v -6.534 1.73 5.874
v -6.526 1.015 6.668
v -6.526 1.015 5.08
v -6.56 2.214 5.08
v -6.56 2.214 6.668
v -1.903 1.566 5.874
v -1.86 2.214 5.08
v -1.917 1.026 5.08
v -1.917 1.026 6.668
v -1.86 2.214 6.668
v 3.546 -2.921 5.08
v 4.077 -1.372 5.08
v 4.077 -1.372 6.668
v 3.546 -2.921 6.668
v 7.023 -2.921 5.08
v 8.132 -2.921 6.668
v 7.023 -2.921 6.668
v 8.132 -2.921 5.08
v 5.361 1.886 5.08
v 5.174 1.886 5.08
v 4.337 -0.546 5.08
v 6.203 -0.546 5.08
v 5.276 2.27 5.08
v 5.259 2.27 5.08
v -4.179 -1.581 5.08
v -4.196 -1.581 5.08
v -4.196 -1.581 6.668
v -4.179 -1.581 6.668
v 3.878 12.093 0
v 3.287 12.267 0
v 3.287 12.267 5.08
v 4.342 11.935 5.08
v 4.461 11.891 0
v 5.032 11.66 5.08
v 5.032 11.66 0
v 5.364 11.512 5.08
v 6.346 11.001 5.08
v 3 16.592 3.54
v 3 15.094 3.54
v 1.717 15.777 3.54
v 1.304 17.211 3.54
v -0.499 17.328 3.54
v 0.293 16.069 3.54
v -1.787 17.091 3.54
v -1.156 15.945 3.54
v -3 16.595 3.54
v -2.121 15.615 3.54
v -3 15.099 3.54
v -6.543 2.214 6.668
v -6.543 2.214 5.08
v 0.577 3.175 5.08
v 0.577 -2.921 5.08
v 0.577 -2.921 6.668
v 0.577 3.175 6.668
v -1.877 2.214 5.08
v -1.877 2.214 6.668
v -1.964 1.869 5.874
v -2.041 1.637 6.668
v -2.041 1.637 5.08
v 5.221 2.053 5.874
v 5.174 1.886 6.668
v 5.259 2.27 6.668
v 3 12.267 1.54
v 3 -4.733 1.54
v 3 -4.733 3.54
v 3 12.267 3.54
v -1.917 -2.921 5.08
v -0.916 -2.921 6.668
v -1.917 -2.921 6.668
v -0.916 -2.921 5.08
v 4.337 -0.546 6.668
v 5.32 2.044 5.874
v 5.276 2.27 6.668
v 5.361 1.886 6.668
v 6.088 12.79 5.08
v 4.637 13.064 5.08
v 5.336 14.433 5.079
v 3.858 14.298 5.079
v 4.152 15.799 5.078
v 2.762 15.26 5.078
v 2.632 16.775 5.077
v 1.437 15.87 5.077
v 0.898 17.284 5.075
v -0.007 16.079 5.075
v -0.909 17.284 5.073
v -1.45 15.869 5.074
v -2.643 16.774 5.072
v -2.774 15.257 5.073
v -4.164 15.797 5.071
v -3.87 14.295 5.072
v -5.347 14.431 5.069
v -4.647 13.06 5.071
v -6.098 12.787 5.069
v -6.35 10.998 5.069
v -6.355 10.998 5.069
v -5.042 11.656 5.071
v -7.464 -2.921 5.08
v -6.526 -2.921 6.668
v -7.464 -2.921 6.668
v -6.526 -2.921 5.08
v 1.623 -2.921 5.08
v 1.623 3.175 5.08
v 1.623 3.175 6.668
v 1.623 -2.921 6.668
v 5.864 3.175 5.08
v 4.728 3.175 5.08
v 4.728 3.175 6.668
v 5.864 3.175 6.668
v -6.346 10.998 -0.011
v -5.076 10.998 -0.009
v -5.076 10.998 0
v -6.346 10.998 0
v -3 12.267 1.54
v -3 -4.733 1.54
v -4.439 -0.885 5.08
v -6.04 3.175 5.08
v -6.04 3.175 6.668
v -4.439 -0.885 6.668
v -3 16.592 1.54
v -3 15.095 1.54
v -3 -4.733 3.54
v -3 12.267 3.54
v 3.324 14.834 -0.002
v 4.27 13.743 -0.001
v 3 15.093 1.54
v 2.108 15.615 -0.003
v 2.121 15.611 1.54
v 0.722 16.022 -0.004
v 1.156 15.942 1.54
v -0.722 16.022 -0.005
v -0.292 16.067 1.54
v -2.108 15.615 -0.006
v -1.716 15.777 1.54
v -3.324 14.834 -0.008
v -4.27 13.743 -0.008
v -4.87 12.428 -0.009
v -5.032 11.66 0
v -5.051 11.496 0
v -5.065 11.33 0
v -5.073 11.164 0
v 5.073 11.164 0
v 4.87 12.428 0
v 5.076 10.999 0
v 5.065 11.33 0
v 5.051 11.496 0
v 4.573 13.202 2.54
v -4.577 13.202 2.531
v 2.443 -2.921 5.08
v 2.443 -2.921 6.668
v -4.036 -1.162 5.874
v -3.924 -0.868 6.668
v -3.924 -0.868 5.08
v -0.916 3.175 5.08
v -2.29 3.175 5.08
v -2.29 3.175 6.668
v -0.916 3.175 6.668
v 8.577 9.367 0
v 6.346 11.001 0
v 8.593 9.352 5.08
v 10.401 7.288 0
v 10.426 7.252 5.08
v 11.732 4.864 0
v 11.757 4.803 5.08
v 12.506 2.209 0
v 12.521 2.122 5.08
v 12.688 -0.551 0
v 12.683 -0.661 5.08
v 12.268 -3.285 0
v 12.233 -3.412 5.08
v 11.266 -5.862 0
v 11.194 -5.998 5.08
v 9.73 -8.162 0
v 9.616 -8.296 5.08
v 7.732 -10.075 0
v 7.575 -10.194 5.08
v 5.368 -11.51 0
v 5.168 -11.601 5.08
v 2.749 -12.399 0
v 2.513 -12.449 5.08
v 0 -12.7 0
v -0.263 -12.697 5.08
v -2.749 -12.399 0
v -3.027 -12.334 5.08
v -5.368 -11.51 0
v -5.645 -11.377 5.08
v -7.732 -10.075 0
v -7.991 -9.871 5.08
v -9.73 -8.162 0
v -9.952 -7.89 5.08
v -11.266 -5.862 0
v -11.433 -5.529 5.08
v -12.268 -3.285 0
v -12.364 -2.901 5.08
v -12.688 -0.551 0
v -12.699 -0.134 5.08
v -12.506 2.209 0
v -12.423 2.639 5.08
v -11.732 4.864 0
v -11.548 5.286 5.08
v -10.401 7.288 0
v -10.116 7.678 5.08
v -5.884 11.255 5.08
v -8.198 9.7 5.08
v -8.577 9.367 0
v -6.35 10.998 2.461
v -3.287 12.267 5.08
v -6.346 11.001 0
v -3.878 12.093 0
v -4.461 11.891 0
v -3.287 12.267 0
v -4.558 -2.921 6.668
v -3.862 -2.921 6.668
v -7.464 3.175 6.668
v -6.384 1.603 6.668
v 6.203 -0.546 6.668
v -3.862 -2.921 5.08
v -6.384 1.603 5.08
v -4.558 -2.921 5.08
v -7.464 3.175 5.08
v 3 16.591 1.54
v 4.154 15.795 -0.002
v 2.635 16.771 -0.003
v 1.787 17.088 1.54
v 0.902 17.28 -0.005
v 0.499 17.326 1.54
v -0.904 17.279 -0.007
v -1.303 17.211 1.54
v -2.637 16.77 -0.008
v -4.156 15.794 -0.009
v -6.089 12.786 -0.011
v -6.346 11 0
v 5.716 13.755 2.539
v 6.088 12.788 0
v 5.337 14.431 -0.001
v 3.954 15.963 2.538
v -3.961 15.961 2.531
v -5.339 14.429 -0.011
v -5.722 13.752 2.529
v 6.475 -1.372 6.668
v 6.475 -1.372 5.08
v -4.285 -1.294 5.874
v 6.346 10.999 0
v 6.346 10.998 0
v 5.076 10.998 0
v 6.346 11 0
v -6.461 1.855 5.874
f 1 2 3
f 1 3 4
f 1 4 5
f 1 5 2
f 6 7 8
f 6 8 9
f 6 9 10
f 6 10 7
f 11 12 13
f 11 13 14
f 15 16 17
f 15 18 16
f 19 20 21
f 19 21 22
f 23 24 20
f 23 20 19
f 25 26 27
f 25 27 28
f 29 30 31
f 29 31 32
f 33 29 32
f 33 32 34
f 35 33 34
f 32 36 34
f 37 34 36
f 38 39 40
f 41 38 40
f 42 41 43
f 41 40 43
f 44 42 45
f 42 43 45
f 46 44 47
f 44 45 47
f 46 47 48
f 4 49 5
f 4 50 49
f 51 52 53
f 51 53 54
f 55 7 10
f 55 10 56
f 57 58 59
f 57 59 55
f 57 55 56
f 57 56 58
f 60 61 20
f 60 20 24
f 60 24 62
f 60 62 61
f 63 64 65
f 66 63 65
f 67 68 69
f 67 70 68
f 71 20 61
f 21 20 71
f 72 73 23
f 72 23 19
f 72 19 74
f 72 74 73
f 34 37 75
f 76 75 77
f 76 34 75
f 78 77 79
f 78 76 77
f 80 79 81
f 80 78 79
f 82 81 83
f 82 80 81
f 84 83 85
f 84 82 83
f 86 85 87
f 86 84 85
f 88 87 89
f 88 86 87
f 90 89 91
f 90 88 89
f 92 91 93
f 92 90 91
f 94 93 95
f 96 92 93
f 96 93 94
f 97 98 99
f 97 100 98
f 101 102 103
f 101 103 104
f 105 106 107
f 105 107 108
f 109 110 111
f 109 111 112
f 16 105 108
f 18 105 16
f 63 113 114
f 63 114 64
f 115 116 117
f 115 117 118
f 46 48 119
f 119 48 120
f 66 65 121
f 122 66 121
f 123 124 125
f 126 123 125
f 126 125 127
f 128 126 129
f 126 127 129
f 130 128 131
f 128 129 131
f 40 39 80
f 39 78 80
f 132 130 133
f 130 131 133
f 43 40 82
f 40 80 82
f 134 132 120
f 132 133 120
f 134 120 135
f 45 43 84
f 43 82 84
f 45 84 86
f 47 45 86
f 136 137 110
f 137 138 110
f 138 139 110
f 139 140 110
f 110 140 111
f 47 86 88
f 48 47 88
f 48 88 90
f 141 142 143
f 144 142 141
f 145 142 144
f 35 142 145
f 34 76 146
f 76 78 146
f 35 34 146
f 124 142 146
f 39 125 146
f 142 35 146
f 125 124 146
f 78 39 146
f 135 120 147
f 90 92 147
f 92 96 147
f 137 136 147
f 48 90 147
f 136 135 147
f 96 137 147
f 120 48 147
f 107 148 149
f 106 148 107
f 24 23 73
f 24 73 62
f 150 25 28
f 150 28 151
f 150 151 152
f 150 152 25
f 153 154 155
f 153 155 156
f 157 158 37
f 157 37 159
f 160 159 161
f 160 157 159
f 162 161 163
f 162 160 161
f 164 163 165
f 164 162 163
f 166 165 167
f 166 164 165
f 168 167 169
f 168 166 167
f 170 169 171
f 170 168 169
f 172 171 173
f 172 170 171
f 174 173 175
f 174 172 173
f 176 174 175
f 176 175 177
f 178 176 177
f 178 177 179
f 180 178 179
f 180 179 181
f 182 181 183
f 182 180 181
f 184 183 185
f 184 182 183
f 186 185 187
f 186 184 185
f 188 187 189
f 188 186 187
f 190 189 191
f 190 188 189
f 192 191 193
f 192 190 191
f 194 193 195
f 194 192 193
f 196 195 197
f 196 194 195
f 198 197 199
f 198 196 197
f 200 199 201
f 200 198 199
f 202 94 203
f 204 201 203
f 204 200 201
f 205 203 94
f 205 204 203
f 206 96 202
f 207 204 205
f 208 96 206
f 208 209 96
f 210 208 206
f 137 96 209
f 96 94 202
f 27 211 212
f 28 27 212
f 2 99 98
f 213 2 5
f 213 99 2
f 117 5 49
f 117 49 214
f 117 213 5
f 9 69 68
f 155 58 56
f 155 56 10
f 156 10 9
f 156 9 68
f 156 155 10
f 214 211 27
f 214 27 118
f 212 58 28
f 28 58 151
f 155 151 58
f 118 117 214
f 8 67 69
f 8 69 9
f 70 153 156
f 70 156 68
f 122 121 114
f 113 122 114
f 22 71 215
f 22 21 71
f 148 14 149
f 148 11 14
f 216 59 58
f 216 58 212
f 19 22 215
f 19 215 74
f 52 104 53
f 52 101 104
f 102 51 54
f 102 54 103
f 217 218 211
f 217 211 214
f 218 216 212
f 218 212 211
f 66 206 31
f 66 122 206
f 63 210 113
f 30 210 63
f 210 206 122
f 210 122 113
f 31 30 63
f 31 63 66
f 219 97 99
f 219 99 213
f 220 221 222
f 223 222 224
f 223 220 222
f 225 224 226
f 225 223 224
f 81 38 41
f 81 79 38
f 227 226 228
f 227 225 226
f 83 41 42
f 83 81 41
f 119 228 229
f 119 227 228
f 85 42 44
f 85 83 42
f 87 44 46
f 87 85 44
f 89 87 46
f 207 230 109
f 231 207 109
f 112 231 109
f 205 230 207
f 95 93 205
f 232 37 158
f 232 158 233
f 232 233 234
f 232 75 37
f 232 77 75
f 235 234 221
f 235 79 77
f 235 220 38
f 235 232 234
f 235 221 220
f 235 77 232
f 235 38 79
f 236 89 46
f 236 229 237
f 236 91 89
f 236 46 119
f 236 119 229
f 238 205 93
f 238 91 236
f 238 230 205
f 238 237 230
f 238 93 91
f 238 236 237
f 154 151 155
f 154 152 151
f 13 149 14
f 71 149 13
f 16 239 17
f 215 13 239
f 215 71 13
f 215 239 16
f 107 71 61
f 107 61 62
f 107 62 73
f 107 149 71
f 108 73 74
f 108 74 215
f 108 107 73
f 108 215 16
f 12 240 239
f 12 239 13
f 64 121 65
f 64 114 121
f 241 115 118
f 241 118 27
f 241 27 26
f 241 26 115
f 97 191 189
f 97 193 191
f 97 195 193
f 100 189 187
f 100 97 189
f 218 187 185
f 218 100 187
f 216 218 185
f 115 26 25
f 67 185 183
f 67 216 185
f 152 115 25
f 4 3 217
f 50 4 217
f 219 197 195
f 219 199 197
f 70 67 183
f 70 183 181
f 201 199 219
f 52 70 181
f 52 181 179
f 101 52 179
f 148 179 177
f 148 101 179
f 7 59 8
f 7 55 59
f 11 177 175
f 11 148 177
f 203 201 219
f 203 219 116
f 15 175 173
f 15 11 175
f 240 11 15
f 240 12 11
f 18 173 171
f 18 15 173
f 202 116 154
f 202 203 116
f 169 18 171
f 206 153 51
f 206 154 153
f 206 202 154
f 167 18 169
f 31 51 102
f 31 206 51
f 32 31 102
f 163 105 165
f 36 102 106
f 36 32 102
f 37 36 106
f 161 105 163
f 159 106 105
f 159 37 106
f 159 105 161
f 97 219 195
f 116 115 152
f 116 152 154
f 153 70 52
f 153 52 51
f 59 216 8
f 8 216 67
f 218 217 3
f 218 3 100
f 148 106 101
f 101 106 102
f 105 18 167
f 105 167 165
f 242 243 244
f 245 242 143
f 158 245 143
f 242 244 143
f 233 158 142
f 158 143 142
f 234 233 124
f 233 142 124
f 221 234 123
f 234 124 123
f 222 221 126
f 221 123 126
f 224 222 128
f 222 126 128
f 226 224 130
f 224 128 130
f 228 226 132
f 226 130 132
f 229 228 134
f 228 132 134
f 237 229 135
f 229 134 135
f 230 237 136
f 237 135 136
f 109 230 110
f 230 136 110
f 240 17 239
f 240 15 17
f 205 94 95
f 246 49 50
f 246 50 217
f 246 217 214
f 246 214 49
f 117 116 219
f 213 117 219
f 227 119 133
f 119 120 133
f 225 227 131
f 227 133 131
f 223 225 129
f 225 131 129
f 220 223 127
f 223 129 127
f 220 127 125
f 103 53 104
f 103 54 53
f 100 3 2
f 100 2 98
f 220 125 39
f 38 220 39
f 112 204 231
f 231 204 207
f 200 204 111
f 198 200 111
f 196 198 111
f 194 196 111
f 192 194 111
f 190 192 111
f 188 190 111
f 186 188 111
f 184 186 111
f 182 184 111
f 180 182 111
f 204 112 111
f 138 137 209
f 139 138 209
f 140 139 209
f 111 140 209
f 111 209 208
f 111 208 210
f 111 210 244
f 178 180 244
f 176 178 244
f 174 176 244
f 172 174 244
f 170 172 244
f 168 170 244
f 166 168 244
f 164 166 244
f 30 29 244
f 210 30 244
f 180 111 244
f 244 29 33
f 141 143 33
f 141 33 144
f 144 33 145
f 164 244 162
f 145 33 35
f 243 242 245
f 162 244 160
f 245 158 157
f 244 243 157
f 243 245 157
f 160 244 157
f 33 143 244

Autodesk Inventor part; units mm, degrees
ref_plane "YZ Plane" through (0, 0, 0) normal (1, 0, 0) x (0, 1, 0)
ref_plane "XZ Plane" through (0, 0, 0) normal (0, 1, 0) x (-1, 0, 0)
ref_plane "XY Plane" through (0, 0, 0) normal (0, 0, 1) x (1, 0, 0)
sketch "Sketch1" plane through (0, 0, 0) normal (0, 0, 1) x (1, 0, 0)
  circle A0 centre (0, 0) radius 12.7
  arc A1 (3.287, 12.2673) -> (-3.287, 12.2673) centre (0, 0) ccw
  line L0 (0, 0) -> (3.287, 12.2673) construction
  line L1 (0, 0) -> (12.7, 0) construction
  line L2 (0, 0) -> (-3.287, 12.2673) construction
  line L3 (-3.287, 12.2673) -> (3.287, 12.2673)
  point P0 (3.287, 12.2673)
  point P1 (-3.287, 12.2673)
  dimension "d0" = 25.4
  dimension "d1" = 12.7
  dimension "d2" = 75
  dimension "d3" = 30
extrude "Extrusion1" add sketch "Sketch1" along normal blind 5.08 contours A0 L3 picked at (4.079, -0.9801)
sketch "Sketch3" plane through (0, 0, 5.08) normal (0, 0, 1) x (1, 0, 0)
  arc A0 (-3.287, 12.2673) -> (3.287, 12.2673) centre (0, 0) ccw projected
  arc A1 (6.35, 10.9985) -> (-6.35, 10.9985) centre (0, 0) ccw
  line L0 (0, 0) -> (6.35, 10.9985) construction
  line L1 (0, 0) -> (12.7, 0) construction
  line L2 (0, 0) -> (-6.35, 10.9985) construction
  line L3 (-6.35, 10.9985) -> (6.35, 10.9985)
  dimension "d12" = 60
  dimension "d13" = 60
ref_plane "Work Plane1" through (-6.35, 10.9985, 5.08) normal (0, 1, 0) x (1, 0, 0)
sketch "Sketch4" plane through (-6.35, 10.9985, 5.08) normal (0, 1, 0) x (1, 0, 0)
  line L0 (-6.35, 0) -> (19.05, 0) projected
  line L1 (-6.35, 5.08) -> (19.05, 5.08) projected
  line L2 (-0.0044, 0) -> (12.6956, 0)
  line L3 (12.6956, 0) -> (12.6956, 5.08)
  line L4 (12.6956, 5.08) -> (-0.0044, 5.08)
  line L5 (-0.0044, 5.08) -> (-0.0044, 0)
  line L6 (-0.0044, 5.08) -> (1.2656, 5.08)
  line L7 (1.2656, 5.08) -> (1.2656, 0)
  line L8 (1.2656, 0) -> (-0.0044, 0)
  line L9 (-0.0044, 0) -> (-0.0044, 5.08)
  line L10 (12.6956, 0) -> (11.4256, 0)
  line L11 (11.4256, 0) -> (11.4256, 5.08)
  line L12 (11.4256, 5.08) -> (12.6956, 5.08)
  line L13 (12.6956, 5.08) -> (12.6956, 0)
  line L14 (6.35, 5.08) -> (6.3456, 0)
  point P0 (3.063, 0)
  point P1 (9.637, 0)
  point P2 (3.063, 5.08)
  point P3 (9.637, 5.08)
  dimension "d15" = 12.7
  dimension "d16" = 1.27
  dimension "d17" = 1.27
revolve "Revolution1" add sketch "Sketch4" angle 180 about axis through (0, 10.9985, 0) along (-0.0009, 0, 1) contours L11 L1 L3 L0
sketch "Sketch5" plane through (0, 0, 5.08) normal (0, 0, 1) x (1, 0, 0)
  line L0 (6.35, -3.175) -> (-6.35, -3.175)
  line L1 (-6.35, -3.175) -> (-6.35, 3.175)
  line L2 (-6.35, 3.175) -> (6.35, 3.175)
  line L3 (6.35, 3.175) -> (6.35, -3.175)
  line L4 (6.35, -3.175) -> (-6.35, 3.175) construction
  line L5 (-6.35, -3.175) -> (6.35, 3.175) construction
  line L6 (-9.525, 3.175) -> (9.525, 3.175) construction
  line L7 (9.525, 3.175) -> (9.525, -3.0049) construction
  line L8 (9.525, -3.0049) -> (-9.525, -3.0049) construction
  line L9 (-9.525, -3.0049) -> (-9.525, 3.175) construction
  line L10 (-6.35, 3.175) -> (-9.525, 3.175)
  line L11 (-0.9161, -2.921) -> (-1.917, -2.921)
  line L12 (-1.917, -2.921) -> (-1.917, 1.0261)
  spline S0 degree 2 poles (-1.917, 1.0261) (-1.917, 1.5125) (-1.8605, 2.2137) knots 0 0 0 1 1 1
  line L13 (-1.8605, 2.2137) -> (-1.8774, 2.2137)
  spline S1 degree 2 poles (-1.8774, 2.2137) (-1.9679, 1.8122) (-2.0414, 1.6369) knots 0 0 0 1 1 1
  line L14 (-2.0414, 1.6369) -> (-3.8623, -2.921)
  line L15 (-3.8623, -2.921) -> (-4.5579, -2.921)
  line L16 (-4.5579, -2.921) -> (-6.3844, 1.6029)
  spline S2 degree 2 poles (-6.3844, 1.6029) (-6.4579, 1.8009) (-6.5427, 2.2137) knots 0 0 0 1 1 1
  line L17 (-6.5427, 2.2137) -> (-6.5597, 2.2137)
  spline S3 degree 2 poles (-6.5597, 2.2137) (-6.5258, 1.8461) (-6.5258, 1.0148) knots 0 0 0 1 1 1
  line L18 (-6.5258, 1.0148) -> (-6.5258, -2.921)
  line L19 (-6.5258, -2.921) -> (-7.4645, -2.921)
  line L20 (-7.4645, -2.921) -> (-7.4645, 3.175)
  line L21 (-7.4645, 3.175) -> (-6.0395, 3.175)
  line L22 (-6.0395, 3.175) -> (-4.4391, -0.8852)
  spline S4 degree 2 poles (-4.4391, -0.8852) (-4.2525, -1.3546) (-4.1959, -1.5808) knots 0 0 0 1 1 1
  line L23 (-4.1959, -1.5808) -> (-4.179, -1.5808)
  spline S5 degree 2 poles (-4.179, -1.5808) (-4.0206, -1.1001) (-3.9245, -0.8683) knots 0 0 0 1 1 1
  line L24 (-3.9245, -0.8683) -> (-2.2902, 3.175)
  line L25 (-2.2902, 3.175) -> (-0.9161, 3.175)
  line L26 (-0.9161, 3.175) -> (-0.9161, -2.921)
  line L27 (1.623, -2.921) -> (0.5768, -2.921)
  line L28 (0.5768, -2.921) -> (0.5768, 3.175)
  line L29 (0.5768, 3.175) -> (1.623, 3.175)
  line L30 (1.623, 3.175) -> (1.623, -2.921)
  line L31 (8.1318, -2.921) -> (7.0234, -2.921)
  line L32 (7.0234, -2.921) -> (6.4749, -1.3716)
  line L33 (6.4749, -1.3716) -> (4.0772, -1.3716)
  line L34 (4.0772, -1.3716) -> (3.5456, -2.921)
  line L35 (3.5456, -2.921) -> (2.4429, -2.921)
  line L36 (2.4429, -2.921) -> (4.7275, 3.175)
  line L37 (4.7275, 3.175) -> (5.8641, 3.175)
  line L38 (5.8641, 3.175) -> (8.1318, -2.921)
  line L39 (6.2034, -0.5459) -> (5.3609, 1.8857)
  spline S6 degree 2 poles (5.3609, 1.8857) (5.3213, 2.0101) (5.276, 2.2702) knots 0 0 0 1 1 1
  line L40 (5.276, 2.2702) -> (5.2591, 2.2702)
  spline S7 degree 2 poles (5.2591, 2.2702) (5.2251, 2.0271) (5.1742, 1.8857) knots 0 0 0 1 1 1
  line L41 (5.1742, 1.8857) -> (4.3373, -0.5459)
  line L42 (4.3373, -0.5459) -> (6.2034, -0.5459)
  point P0 (0, 0)
  dimension "d19" = 12.7
  dimension "d20" = 6.35
  dimension "d21" = 19.05
  dimension "d22" = 3.175
extrude "Extrusion3" add sketch "Sketch5" along normal blind 1.5875 contours L33 L34 L35 L36 L2 L38 L3 | L3 L38 L31 L32 L33 | L16 S2 L17 S3 L18 L19 L20 L10 L1 | L1 L2 L22 S4 L23 S5 L24 L26 L11 L12 S0 L13 S1 L14 L15 L16 | L30 L27 L28 L2
sketch "Sketch2" plane through (-3.287, 12.2673, 0) normal (0, 1, 0) x (1, 0, 0)
  line L0 (6.574, 0) -> (0, 0) projected
  line L1 (6.574, -5.08) -> (0, -5.08) projected
  line L2 (0, 0) -> (6.574, 0)
  line L3 (6.574, 0) -> (6.574, -5.08)
  line L4 (6.574, -5.08) -> (0, -5.08)
  line L5 (0, -5.08) -> (0, 0)
  line L6 (3.287, 0) -> (3.287, -5.08)
  line L7 (0.287, -1.54) -> (6.287, -1.54)
  line L8 (6.287, -1.54) -> (6.287, -3.54)
  line L9 (6.287, -3.54) -> (0.287, -3.54)
  line L10 (0.287, -3.54) -> (0.287, -1.54)
  line L11 (0.287, -1.54) -> (6.287, -3.54) construction
  line L12 (6.287, -1.54) -> (0.287, -3.54) construction
  point P0 (3.287, -2.54)
  dimension "d6" = 6.574
  dimension "d8" = 6
  dimension "d9" = 2
extrude "Extrusion2" cut sketch "Sketch2" along normal blind 12.7 and the other way blind 17 contours L7 L8 L9 L6 | L6 L9 L10 L7
properties part number "MIA Pendant 2"
